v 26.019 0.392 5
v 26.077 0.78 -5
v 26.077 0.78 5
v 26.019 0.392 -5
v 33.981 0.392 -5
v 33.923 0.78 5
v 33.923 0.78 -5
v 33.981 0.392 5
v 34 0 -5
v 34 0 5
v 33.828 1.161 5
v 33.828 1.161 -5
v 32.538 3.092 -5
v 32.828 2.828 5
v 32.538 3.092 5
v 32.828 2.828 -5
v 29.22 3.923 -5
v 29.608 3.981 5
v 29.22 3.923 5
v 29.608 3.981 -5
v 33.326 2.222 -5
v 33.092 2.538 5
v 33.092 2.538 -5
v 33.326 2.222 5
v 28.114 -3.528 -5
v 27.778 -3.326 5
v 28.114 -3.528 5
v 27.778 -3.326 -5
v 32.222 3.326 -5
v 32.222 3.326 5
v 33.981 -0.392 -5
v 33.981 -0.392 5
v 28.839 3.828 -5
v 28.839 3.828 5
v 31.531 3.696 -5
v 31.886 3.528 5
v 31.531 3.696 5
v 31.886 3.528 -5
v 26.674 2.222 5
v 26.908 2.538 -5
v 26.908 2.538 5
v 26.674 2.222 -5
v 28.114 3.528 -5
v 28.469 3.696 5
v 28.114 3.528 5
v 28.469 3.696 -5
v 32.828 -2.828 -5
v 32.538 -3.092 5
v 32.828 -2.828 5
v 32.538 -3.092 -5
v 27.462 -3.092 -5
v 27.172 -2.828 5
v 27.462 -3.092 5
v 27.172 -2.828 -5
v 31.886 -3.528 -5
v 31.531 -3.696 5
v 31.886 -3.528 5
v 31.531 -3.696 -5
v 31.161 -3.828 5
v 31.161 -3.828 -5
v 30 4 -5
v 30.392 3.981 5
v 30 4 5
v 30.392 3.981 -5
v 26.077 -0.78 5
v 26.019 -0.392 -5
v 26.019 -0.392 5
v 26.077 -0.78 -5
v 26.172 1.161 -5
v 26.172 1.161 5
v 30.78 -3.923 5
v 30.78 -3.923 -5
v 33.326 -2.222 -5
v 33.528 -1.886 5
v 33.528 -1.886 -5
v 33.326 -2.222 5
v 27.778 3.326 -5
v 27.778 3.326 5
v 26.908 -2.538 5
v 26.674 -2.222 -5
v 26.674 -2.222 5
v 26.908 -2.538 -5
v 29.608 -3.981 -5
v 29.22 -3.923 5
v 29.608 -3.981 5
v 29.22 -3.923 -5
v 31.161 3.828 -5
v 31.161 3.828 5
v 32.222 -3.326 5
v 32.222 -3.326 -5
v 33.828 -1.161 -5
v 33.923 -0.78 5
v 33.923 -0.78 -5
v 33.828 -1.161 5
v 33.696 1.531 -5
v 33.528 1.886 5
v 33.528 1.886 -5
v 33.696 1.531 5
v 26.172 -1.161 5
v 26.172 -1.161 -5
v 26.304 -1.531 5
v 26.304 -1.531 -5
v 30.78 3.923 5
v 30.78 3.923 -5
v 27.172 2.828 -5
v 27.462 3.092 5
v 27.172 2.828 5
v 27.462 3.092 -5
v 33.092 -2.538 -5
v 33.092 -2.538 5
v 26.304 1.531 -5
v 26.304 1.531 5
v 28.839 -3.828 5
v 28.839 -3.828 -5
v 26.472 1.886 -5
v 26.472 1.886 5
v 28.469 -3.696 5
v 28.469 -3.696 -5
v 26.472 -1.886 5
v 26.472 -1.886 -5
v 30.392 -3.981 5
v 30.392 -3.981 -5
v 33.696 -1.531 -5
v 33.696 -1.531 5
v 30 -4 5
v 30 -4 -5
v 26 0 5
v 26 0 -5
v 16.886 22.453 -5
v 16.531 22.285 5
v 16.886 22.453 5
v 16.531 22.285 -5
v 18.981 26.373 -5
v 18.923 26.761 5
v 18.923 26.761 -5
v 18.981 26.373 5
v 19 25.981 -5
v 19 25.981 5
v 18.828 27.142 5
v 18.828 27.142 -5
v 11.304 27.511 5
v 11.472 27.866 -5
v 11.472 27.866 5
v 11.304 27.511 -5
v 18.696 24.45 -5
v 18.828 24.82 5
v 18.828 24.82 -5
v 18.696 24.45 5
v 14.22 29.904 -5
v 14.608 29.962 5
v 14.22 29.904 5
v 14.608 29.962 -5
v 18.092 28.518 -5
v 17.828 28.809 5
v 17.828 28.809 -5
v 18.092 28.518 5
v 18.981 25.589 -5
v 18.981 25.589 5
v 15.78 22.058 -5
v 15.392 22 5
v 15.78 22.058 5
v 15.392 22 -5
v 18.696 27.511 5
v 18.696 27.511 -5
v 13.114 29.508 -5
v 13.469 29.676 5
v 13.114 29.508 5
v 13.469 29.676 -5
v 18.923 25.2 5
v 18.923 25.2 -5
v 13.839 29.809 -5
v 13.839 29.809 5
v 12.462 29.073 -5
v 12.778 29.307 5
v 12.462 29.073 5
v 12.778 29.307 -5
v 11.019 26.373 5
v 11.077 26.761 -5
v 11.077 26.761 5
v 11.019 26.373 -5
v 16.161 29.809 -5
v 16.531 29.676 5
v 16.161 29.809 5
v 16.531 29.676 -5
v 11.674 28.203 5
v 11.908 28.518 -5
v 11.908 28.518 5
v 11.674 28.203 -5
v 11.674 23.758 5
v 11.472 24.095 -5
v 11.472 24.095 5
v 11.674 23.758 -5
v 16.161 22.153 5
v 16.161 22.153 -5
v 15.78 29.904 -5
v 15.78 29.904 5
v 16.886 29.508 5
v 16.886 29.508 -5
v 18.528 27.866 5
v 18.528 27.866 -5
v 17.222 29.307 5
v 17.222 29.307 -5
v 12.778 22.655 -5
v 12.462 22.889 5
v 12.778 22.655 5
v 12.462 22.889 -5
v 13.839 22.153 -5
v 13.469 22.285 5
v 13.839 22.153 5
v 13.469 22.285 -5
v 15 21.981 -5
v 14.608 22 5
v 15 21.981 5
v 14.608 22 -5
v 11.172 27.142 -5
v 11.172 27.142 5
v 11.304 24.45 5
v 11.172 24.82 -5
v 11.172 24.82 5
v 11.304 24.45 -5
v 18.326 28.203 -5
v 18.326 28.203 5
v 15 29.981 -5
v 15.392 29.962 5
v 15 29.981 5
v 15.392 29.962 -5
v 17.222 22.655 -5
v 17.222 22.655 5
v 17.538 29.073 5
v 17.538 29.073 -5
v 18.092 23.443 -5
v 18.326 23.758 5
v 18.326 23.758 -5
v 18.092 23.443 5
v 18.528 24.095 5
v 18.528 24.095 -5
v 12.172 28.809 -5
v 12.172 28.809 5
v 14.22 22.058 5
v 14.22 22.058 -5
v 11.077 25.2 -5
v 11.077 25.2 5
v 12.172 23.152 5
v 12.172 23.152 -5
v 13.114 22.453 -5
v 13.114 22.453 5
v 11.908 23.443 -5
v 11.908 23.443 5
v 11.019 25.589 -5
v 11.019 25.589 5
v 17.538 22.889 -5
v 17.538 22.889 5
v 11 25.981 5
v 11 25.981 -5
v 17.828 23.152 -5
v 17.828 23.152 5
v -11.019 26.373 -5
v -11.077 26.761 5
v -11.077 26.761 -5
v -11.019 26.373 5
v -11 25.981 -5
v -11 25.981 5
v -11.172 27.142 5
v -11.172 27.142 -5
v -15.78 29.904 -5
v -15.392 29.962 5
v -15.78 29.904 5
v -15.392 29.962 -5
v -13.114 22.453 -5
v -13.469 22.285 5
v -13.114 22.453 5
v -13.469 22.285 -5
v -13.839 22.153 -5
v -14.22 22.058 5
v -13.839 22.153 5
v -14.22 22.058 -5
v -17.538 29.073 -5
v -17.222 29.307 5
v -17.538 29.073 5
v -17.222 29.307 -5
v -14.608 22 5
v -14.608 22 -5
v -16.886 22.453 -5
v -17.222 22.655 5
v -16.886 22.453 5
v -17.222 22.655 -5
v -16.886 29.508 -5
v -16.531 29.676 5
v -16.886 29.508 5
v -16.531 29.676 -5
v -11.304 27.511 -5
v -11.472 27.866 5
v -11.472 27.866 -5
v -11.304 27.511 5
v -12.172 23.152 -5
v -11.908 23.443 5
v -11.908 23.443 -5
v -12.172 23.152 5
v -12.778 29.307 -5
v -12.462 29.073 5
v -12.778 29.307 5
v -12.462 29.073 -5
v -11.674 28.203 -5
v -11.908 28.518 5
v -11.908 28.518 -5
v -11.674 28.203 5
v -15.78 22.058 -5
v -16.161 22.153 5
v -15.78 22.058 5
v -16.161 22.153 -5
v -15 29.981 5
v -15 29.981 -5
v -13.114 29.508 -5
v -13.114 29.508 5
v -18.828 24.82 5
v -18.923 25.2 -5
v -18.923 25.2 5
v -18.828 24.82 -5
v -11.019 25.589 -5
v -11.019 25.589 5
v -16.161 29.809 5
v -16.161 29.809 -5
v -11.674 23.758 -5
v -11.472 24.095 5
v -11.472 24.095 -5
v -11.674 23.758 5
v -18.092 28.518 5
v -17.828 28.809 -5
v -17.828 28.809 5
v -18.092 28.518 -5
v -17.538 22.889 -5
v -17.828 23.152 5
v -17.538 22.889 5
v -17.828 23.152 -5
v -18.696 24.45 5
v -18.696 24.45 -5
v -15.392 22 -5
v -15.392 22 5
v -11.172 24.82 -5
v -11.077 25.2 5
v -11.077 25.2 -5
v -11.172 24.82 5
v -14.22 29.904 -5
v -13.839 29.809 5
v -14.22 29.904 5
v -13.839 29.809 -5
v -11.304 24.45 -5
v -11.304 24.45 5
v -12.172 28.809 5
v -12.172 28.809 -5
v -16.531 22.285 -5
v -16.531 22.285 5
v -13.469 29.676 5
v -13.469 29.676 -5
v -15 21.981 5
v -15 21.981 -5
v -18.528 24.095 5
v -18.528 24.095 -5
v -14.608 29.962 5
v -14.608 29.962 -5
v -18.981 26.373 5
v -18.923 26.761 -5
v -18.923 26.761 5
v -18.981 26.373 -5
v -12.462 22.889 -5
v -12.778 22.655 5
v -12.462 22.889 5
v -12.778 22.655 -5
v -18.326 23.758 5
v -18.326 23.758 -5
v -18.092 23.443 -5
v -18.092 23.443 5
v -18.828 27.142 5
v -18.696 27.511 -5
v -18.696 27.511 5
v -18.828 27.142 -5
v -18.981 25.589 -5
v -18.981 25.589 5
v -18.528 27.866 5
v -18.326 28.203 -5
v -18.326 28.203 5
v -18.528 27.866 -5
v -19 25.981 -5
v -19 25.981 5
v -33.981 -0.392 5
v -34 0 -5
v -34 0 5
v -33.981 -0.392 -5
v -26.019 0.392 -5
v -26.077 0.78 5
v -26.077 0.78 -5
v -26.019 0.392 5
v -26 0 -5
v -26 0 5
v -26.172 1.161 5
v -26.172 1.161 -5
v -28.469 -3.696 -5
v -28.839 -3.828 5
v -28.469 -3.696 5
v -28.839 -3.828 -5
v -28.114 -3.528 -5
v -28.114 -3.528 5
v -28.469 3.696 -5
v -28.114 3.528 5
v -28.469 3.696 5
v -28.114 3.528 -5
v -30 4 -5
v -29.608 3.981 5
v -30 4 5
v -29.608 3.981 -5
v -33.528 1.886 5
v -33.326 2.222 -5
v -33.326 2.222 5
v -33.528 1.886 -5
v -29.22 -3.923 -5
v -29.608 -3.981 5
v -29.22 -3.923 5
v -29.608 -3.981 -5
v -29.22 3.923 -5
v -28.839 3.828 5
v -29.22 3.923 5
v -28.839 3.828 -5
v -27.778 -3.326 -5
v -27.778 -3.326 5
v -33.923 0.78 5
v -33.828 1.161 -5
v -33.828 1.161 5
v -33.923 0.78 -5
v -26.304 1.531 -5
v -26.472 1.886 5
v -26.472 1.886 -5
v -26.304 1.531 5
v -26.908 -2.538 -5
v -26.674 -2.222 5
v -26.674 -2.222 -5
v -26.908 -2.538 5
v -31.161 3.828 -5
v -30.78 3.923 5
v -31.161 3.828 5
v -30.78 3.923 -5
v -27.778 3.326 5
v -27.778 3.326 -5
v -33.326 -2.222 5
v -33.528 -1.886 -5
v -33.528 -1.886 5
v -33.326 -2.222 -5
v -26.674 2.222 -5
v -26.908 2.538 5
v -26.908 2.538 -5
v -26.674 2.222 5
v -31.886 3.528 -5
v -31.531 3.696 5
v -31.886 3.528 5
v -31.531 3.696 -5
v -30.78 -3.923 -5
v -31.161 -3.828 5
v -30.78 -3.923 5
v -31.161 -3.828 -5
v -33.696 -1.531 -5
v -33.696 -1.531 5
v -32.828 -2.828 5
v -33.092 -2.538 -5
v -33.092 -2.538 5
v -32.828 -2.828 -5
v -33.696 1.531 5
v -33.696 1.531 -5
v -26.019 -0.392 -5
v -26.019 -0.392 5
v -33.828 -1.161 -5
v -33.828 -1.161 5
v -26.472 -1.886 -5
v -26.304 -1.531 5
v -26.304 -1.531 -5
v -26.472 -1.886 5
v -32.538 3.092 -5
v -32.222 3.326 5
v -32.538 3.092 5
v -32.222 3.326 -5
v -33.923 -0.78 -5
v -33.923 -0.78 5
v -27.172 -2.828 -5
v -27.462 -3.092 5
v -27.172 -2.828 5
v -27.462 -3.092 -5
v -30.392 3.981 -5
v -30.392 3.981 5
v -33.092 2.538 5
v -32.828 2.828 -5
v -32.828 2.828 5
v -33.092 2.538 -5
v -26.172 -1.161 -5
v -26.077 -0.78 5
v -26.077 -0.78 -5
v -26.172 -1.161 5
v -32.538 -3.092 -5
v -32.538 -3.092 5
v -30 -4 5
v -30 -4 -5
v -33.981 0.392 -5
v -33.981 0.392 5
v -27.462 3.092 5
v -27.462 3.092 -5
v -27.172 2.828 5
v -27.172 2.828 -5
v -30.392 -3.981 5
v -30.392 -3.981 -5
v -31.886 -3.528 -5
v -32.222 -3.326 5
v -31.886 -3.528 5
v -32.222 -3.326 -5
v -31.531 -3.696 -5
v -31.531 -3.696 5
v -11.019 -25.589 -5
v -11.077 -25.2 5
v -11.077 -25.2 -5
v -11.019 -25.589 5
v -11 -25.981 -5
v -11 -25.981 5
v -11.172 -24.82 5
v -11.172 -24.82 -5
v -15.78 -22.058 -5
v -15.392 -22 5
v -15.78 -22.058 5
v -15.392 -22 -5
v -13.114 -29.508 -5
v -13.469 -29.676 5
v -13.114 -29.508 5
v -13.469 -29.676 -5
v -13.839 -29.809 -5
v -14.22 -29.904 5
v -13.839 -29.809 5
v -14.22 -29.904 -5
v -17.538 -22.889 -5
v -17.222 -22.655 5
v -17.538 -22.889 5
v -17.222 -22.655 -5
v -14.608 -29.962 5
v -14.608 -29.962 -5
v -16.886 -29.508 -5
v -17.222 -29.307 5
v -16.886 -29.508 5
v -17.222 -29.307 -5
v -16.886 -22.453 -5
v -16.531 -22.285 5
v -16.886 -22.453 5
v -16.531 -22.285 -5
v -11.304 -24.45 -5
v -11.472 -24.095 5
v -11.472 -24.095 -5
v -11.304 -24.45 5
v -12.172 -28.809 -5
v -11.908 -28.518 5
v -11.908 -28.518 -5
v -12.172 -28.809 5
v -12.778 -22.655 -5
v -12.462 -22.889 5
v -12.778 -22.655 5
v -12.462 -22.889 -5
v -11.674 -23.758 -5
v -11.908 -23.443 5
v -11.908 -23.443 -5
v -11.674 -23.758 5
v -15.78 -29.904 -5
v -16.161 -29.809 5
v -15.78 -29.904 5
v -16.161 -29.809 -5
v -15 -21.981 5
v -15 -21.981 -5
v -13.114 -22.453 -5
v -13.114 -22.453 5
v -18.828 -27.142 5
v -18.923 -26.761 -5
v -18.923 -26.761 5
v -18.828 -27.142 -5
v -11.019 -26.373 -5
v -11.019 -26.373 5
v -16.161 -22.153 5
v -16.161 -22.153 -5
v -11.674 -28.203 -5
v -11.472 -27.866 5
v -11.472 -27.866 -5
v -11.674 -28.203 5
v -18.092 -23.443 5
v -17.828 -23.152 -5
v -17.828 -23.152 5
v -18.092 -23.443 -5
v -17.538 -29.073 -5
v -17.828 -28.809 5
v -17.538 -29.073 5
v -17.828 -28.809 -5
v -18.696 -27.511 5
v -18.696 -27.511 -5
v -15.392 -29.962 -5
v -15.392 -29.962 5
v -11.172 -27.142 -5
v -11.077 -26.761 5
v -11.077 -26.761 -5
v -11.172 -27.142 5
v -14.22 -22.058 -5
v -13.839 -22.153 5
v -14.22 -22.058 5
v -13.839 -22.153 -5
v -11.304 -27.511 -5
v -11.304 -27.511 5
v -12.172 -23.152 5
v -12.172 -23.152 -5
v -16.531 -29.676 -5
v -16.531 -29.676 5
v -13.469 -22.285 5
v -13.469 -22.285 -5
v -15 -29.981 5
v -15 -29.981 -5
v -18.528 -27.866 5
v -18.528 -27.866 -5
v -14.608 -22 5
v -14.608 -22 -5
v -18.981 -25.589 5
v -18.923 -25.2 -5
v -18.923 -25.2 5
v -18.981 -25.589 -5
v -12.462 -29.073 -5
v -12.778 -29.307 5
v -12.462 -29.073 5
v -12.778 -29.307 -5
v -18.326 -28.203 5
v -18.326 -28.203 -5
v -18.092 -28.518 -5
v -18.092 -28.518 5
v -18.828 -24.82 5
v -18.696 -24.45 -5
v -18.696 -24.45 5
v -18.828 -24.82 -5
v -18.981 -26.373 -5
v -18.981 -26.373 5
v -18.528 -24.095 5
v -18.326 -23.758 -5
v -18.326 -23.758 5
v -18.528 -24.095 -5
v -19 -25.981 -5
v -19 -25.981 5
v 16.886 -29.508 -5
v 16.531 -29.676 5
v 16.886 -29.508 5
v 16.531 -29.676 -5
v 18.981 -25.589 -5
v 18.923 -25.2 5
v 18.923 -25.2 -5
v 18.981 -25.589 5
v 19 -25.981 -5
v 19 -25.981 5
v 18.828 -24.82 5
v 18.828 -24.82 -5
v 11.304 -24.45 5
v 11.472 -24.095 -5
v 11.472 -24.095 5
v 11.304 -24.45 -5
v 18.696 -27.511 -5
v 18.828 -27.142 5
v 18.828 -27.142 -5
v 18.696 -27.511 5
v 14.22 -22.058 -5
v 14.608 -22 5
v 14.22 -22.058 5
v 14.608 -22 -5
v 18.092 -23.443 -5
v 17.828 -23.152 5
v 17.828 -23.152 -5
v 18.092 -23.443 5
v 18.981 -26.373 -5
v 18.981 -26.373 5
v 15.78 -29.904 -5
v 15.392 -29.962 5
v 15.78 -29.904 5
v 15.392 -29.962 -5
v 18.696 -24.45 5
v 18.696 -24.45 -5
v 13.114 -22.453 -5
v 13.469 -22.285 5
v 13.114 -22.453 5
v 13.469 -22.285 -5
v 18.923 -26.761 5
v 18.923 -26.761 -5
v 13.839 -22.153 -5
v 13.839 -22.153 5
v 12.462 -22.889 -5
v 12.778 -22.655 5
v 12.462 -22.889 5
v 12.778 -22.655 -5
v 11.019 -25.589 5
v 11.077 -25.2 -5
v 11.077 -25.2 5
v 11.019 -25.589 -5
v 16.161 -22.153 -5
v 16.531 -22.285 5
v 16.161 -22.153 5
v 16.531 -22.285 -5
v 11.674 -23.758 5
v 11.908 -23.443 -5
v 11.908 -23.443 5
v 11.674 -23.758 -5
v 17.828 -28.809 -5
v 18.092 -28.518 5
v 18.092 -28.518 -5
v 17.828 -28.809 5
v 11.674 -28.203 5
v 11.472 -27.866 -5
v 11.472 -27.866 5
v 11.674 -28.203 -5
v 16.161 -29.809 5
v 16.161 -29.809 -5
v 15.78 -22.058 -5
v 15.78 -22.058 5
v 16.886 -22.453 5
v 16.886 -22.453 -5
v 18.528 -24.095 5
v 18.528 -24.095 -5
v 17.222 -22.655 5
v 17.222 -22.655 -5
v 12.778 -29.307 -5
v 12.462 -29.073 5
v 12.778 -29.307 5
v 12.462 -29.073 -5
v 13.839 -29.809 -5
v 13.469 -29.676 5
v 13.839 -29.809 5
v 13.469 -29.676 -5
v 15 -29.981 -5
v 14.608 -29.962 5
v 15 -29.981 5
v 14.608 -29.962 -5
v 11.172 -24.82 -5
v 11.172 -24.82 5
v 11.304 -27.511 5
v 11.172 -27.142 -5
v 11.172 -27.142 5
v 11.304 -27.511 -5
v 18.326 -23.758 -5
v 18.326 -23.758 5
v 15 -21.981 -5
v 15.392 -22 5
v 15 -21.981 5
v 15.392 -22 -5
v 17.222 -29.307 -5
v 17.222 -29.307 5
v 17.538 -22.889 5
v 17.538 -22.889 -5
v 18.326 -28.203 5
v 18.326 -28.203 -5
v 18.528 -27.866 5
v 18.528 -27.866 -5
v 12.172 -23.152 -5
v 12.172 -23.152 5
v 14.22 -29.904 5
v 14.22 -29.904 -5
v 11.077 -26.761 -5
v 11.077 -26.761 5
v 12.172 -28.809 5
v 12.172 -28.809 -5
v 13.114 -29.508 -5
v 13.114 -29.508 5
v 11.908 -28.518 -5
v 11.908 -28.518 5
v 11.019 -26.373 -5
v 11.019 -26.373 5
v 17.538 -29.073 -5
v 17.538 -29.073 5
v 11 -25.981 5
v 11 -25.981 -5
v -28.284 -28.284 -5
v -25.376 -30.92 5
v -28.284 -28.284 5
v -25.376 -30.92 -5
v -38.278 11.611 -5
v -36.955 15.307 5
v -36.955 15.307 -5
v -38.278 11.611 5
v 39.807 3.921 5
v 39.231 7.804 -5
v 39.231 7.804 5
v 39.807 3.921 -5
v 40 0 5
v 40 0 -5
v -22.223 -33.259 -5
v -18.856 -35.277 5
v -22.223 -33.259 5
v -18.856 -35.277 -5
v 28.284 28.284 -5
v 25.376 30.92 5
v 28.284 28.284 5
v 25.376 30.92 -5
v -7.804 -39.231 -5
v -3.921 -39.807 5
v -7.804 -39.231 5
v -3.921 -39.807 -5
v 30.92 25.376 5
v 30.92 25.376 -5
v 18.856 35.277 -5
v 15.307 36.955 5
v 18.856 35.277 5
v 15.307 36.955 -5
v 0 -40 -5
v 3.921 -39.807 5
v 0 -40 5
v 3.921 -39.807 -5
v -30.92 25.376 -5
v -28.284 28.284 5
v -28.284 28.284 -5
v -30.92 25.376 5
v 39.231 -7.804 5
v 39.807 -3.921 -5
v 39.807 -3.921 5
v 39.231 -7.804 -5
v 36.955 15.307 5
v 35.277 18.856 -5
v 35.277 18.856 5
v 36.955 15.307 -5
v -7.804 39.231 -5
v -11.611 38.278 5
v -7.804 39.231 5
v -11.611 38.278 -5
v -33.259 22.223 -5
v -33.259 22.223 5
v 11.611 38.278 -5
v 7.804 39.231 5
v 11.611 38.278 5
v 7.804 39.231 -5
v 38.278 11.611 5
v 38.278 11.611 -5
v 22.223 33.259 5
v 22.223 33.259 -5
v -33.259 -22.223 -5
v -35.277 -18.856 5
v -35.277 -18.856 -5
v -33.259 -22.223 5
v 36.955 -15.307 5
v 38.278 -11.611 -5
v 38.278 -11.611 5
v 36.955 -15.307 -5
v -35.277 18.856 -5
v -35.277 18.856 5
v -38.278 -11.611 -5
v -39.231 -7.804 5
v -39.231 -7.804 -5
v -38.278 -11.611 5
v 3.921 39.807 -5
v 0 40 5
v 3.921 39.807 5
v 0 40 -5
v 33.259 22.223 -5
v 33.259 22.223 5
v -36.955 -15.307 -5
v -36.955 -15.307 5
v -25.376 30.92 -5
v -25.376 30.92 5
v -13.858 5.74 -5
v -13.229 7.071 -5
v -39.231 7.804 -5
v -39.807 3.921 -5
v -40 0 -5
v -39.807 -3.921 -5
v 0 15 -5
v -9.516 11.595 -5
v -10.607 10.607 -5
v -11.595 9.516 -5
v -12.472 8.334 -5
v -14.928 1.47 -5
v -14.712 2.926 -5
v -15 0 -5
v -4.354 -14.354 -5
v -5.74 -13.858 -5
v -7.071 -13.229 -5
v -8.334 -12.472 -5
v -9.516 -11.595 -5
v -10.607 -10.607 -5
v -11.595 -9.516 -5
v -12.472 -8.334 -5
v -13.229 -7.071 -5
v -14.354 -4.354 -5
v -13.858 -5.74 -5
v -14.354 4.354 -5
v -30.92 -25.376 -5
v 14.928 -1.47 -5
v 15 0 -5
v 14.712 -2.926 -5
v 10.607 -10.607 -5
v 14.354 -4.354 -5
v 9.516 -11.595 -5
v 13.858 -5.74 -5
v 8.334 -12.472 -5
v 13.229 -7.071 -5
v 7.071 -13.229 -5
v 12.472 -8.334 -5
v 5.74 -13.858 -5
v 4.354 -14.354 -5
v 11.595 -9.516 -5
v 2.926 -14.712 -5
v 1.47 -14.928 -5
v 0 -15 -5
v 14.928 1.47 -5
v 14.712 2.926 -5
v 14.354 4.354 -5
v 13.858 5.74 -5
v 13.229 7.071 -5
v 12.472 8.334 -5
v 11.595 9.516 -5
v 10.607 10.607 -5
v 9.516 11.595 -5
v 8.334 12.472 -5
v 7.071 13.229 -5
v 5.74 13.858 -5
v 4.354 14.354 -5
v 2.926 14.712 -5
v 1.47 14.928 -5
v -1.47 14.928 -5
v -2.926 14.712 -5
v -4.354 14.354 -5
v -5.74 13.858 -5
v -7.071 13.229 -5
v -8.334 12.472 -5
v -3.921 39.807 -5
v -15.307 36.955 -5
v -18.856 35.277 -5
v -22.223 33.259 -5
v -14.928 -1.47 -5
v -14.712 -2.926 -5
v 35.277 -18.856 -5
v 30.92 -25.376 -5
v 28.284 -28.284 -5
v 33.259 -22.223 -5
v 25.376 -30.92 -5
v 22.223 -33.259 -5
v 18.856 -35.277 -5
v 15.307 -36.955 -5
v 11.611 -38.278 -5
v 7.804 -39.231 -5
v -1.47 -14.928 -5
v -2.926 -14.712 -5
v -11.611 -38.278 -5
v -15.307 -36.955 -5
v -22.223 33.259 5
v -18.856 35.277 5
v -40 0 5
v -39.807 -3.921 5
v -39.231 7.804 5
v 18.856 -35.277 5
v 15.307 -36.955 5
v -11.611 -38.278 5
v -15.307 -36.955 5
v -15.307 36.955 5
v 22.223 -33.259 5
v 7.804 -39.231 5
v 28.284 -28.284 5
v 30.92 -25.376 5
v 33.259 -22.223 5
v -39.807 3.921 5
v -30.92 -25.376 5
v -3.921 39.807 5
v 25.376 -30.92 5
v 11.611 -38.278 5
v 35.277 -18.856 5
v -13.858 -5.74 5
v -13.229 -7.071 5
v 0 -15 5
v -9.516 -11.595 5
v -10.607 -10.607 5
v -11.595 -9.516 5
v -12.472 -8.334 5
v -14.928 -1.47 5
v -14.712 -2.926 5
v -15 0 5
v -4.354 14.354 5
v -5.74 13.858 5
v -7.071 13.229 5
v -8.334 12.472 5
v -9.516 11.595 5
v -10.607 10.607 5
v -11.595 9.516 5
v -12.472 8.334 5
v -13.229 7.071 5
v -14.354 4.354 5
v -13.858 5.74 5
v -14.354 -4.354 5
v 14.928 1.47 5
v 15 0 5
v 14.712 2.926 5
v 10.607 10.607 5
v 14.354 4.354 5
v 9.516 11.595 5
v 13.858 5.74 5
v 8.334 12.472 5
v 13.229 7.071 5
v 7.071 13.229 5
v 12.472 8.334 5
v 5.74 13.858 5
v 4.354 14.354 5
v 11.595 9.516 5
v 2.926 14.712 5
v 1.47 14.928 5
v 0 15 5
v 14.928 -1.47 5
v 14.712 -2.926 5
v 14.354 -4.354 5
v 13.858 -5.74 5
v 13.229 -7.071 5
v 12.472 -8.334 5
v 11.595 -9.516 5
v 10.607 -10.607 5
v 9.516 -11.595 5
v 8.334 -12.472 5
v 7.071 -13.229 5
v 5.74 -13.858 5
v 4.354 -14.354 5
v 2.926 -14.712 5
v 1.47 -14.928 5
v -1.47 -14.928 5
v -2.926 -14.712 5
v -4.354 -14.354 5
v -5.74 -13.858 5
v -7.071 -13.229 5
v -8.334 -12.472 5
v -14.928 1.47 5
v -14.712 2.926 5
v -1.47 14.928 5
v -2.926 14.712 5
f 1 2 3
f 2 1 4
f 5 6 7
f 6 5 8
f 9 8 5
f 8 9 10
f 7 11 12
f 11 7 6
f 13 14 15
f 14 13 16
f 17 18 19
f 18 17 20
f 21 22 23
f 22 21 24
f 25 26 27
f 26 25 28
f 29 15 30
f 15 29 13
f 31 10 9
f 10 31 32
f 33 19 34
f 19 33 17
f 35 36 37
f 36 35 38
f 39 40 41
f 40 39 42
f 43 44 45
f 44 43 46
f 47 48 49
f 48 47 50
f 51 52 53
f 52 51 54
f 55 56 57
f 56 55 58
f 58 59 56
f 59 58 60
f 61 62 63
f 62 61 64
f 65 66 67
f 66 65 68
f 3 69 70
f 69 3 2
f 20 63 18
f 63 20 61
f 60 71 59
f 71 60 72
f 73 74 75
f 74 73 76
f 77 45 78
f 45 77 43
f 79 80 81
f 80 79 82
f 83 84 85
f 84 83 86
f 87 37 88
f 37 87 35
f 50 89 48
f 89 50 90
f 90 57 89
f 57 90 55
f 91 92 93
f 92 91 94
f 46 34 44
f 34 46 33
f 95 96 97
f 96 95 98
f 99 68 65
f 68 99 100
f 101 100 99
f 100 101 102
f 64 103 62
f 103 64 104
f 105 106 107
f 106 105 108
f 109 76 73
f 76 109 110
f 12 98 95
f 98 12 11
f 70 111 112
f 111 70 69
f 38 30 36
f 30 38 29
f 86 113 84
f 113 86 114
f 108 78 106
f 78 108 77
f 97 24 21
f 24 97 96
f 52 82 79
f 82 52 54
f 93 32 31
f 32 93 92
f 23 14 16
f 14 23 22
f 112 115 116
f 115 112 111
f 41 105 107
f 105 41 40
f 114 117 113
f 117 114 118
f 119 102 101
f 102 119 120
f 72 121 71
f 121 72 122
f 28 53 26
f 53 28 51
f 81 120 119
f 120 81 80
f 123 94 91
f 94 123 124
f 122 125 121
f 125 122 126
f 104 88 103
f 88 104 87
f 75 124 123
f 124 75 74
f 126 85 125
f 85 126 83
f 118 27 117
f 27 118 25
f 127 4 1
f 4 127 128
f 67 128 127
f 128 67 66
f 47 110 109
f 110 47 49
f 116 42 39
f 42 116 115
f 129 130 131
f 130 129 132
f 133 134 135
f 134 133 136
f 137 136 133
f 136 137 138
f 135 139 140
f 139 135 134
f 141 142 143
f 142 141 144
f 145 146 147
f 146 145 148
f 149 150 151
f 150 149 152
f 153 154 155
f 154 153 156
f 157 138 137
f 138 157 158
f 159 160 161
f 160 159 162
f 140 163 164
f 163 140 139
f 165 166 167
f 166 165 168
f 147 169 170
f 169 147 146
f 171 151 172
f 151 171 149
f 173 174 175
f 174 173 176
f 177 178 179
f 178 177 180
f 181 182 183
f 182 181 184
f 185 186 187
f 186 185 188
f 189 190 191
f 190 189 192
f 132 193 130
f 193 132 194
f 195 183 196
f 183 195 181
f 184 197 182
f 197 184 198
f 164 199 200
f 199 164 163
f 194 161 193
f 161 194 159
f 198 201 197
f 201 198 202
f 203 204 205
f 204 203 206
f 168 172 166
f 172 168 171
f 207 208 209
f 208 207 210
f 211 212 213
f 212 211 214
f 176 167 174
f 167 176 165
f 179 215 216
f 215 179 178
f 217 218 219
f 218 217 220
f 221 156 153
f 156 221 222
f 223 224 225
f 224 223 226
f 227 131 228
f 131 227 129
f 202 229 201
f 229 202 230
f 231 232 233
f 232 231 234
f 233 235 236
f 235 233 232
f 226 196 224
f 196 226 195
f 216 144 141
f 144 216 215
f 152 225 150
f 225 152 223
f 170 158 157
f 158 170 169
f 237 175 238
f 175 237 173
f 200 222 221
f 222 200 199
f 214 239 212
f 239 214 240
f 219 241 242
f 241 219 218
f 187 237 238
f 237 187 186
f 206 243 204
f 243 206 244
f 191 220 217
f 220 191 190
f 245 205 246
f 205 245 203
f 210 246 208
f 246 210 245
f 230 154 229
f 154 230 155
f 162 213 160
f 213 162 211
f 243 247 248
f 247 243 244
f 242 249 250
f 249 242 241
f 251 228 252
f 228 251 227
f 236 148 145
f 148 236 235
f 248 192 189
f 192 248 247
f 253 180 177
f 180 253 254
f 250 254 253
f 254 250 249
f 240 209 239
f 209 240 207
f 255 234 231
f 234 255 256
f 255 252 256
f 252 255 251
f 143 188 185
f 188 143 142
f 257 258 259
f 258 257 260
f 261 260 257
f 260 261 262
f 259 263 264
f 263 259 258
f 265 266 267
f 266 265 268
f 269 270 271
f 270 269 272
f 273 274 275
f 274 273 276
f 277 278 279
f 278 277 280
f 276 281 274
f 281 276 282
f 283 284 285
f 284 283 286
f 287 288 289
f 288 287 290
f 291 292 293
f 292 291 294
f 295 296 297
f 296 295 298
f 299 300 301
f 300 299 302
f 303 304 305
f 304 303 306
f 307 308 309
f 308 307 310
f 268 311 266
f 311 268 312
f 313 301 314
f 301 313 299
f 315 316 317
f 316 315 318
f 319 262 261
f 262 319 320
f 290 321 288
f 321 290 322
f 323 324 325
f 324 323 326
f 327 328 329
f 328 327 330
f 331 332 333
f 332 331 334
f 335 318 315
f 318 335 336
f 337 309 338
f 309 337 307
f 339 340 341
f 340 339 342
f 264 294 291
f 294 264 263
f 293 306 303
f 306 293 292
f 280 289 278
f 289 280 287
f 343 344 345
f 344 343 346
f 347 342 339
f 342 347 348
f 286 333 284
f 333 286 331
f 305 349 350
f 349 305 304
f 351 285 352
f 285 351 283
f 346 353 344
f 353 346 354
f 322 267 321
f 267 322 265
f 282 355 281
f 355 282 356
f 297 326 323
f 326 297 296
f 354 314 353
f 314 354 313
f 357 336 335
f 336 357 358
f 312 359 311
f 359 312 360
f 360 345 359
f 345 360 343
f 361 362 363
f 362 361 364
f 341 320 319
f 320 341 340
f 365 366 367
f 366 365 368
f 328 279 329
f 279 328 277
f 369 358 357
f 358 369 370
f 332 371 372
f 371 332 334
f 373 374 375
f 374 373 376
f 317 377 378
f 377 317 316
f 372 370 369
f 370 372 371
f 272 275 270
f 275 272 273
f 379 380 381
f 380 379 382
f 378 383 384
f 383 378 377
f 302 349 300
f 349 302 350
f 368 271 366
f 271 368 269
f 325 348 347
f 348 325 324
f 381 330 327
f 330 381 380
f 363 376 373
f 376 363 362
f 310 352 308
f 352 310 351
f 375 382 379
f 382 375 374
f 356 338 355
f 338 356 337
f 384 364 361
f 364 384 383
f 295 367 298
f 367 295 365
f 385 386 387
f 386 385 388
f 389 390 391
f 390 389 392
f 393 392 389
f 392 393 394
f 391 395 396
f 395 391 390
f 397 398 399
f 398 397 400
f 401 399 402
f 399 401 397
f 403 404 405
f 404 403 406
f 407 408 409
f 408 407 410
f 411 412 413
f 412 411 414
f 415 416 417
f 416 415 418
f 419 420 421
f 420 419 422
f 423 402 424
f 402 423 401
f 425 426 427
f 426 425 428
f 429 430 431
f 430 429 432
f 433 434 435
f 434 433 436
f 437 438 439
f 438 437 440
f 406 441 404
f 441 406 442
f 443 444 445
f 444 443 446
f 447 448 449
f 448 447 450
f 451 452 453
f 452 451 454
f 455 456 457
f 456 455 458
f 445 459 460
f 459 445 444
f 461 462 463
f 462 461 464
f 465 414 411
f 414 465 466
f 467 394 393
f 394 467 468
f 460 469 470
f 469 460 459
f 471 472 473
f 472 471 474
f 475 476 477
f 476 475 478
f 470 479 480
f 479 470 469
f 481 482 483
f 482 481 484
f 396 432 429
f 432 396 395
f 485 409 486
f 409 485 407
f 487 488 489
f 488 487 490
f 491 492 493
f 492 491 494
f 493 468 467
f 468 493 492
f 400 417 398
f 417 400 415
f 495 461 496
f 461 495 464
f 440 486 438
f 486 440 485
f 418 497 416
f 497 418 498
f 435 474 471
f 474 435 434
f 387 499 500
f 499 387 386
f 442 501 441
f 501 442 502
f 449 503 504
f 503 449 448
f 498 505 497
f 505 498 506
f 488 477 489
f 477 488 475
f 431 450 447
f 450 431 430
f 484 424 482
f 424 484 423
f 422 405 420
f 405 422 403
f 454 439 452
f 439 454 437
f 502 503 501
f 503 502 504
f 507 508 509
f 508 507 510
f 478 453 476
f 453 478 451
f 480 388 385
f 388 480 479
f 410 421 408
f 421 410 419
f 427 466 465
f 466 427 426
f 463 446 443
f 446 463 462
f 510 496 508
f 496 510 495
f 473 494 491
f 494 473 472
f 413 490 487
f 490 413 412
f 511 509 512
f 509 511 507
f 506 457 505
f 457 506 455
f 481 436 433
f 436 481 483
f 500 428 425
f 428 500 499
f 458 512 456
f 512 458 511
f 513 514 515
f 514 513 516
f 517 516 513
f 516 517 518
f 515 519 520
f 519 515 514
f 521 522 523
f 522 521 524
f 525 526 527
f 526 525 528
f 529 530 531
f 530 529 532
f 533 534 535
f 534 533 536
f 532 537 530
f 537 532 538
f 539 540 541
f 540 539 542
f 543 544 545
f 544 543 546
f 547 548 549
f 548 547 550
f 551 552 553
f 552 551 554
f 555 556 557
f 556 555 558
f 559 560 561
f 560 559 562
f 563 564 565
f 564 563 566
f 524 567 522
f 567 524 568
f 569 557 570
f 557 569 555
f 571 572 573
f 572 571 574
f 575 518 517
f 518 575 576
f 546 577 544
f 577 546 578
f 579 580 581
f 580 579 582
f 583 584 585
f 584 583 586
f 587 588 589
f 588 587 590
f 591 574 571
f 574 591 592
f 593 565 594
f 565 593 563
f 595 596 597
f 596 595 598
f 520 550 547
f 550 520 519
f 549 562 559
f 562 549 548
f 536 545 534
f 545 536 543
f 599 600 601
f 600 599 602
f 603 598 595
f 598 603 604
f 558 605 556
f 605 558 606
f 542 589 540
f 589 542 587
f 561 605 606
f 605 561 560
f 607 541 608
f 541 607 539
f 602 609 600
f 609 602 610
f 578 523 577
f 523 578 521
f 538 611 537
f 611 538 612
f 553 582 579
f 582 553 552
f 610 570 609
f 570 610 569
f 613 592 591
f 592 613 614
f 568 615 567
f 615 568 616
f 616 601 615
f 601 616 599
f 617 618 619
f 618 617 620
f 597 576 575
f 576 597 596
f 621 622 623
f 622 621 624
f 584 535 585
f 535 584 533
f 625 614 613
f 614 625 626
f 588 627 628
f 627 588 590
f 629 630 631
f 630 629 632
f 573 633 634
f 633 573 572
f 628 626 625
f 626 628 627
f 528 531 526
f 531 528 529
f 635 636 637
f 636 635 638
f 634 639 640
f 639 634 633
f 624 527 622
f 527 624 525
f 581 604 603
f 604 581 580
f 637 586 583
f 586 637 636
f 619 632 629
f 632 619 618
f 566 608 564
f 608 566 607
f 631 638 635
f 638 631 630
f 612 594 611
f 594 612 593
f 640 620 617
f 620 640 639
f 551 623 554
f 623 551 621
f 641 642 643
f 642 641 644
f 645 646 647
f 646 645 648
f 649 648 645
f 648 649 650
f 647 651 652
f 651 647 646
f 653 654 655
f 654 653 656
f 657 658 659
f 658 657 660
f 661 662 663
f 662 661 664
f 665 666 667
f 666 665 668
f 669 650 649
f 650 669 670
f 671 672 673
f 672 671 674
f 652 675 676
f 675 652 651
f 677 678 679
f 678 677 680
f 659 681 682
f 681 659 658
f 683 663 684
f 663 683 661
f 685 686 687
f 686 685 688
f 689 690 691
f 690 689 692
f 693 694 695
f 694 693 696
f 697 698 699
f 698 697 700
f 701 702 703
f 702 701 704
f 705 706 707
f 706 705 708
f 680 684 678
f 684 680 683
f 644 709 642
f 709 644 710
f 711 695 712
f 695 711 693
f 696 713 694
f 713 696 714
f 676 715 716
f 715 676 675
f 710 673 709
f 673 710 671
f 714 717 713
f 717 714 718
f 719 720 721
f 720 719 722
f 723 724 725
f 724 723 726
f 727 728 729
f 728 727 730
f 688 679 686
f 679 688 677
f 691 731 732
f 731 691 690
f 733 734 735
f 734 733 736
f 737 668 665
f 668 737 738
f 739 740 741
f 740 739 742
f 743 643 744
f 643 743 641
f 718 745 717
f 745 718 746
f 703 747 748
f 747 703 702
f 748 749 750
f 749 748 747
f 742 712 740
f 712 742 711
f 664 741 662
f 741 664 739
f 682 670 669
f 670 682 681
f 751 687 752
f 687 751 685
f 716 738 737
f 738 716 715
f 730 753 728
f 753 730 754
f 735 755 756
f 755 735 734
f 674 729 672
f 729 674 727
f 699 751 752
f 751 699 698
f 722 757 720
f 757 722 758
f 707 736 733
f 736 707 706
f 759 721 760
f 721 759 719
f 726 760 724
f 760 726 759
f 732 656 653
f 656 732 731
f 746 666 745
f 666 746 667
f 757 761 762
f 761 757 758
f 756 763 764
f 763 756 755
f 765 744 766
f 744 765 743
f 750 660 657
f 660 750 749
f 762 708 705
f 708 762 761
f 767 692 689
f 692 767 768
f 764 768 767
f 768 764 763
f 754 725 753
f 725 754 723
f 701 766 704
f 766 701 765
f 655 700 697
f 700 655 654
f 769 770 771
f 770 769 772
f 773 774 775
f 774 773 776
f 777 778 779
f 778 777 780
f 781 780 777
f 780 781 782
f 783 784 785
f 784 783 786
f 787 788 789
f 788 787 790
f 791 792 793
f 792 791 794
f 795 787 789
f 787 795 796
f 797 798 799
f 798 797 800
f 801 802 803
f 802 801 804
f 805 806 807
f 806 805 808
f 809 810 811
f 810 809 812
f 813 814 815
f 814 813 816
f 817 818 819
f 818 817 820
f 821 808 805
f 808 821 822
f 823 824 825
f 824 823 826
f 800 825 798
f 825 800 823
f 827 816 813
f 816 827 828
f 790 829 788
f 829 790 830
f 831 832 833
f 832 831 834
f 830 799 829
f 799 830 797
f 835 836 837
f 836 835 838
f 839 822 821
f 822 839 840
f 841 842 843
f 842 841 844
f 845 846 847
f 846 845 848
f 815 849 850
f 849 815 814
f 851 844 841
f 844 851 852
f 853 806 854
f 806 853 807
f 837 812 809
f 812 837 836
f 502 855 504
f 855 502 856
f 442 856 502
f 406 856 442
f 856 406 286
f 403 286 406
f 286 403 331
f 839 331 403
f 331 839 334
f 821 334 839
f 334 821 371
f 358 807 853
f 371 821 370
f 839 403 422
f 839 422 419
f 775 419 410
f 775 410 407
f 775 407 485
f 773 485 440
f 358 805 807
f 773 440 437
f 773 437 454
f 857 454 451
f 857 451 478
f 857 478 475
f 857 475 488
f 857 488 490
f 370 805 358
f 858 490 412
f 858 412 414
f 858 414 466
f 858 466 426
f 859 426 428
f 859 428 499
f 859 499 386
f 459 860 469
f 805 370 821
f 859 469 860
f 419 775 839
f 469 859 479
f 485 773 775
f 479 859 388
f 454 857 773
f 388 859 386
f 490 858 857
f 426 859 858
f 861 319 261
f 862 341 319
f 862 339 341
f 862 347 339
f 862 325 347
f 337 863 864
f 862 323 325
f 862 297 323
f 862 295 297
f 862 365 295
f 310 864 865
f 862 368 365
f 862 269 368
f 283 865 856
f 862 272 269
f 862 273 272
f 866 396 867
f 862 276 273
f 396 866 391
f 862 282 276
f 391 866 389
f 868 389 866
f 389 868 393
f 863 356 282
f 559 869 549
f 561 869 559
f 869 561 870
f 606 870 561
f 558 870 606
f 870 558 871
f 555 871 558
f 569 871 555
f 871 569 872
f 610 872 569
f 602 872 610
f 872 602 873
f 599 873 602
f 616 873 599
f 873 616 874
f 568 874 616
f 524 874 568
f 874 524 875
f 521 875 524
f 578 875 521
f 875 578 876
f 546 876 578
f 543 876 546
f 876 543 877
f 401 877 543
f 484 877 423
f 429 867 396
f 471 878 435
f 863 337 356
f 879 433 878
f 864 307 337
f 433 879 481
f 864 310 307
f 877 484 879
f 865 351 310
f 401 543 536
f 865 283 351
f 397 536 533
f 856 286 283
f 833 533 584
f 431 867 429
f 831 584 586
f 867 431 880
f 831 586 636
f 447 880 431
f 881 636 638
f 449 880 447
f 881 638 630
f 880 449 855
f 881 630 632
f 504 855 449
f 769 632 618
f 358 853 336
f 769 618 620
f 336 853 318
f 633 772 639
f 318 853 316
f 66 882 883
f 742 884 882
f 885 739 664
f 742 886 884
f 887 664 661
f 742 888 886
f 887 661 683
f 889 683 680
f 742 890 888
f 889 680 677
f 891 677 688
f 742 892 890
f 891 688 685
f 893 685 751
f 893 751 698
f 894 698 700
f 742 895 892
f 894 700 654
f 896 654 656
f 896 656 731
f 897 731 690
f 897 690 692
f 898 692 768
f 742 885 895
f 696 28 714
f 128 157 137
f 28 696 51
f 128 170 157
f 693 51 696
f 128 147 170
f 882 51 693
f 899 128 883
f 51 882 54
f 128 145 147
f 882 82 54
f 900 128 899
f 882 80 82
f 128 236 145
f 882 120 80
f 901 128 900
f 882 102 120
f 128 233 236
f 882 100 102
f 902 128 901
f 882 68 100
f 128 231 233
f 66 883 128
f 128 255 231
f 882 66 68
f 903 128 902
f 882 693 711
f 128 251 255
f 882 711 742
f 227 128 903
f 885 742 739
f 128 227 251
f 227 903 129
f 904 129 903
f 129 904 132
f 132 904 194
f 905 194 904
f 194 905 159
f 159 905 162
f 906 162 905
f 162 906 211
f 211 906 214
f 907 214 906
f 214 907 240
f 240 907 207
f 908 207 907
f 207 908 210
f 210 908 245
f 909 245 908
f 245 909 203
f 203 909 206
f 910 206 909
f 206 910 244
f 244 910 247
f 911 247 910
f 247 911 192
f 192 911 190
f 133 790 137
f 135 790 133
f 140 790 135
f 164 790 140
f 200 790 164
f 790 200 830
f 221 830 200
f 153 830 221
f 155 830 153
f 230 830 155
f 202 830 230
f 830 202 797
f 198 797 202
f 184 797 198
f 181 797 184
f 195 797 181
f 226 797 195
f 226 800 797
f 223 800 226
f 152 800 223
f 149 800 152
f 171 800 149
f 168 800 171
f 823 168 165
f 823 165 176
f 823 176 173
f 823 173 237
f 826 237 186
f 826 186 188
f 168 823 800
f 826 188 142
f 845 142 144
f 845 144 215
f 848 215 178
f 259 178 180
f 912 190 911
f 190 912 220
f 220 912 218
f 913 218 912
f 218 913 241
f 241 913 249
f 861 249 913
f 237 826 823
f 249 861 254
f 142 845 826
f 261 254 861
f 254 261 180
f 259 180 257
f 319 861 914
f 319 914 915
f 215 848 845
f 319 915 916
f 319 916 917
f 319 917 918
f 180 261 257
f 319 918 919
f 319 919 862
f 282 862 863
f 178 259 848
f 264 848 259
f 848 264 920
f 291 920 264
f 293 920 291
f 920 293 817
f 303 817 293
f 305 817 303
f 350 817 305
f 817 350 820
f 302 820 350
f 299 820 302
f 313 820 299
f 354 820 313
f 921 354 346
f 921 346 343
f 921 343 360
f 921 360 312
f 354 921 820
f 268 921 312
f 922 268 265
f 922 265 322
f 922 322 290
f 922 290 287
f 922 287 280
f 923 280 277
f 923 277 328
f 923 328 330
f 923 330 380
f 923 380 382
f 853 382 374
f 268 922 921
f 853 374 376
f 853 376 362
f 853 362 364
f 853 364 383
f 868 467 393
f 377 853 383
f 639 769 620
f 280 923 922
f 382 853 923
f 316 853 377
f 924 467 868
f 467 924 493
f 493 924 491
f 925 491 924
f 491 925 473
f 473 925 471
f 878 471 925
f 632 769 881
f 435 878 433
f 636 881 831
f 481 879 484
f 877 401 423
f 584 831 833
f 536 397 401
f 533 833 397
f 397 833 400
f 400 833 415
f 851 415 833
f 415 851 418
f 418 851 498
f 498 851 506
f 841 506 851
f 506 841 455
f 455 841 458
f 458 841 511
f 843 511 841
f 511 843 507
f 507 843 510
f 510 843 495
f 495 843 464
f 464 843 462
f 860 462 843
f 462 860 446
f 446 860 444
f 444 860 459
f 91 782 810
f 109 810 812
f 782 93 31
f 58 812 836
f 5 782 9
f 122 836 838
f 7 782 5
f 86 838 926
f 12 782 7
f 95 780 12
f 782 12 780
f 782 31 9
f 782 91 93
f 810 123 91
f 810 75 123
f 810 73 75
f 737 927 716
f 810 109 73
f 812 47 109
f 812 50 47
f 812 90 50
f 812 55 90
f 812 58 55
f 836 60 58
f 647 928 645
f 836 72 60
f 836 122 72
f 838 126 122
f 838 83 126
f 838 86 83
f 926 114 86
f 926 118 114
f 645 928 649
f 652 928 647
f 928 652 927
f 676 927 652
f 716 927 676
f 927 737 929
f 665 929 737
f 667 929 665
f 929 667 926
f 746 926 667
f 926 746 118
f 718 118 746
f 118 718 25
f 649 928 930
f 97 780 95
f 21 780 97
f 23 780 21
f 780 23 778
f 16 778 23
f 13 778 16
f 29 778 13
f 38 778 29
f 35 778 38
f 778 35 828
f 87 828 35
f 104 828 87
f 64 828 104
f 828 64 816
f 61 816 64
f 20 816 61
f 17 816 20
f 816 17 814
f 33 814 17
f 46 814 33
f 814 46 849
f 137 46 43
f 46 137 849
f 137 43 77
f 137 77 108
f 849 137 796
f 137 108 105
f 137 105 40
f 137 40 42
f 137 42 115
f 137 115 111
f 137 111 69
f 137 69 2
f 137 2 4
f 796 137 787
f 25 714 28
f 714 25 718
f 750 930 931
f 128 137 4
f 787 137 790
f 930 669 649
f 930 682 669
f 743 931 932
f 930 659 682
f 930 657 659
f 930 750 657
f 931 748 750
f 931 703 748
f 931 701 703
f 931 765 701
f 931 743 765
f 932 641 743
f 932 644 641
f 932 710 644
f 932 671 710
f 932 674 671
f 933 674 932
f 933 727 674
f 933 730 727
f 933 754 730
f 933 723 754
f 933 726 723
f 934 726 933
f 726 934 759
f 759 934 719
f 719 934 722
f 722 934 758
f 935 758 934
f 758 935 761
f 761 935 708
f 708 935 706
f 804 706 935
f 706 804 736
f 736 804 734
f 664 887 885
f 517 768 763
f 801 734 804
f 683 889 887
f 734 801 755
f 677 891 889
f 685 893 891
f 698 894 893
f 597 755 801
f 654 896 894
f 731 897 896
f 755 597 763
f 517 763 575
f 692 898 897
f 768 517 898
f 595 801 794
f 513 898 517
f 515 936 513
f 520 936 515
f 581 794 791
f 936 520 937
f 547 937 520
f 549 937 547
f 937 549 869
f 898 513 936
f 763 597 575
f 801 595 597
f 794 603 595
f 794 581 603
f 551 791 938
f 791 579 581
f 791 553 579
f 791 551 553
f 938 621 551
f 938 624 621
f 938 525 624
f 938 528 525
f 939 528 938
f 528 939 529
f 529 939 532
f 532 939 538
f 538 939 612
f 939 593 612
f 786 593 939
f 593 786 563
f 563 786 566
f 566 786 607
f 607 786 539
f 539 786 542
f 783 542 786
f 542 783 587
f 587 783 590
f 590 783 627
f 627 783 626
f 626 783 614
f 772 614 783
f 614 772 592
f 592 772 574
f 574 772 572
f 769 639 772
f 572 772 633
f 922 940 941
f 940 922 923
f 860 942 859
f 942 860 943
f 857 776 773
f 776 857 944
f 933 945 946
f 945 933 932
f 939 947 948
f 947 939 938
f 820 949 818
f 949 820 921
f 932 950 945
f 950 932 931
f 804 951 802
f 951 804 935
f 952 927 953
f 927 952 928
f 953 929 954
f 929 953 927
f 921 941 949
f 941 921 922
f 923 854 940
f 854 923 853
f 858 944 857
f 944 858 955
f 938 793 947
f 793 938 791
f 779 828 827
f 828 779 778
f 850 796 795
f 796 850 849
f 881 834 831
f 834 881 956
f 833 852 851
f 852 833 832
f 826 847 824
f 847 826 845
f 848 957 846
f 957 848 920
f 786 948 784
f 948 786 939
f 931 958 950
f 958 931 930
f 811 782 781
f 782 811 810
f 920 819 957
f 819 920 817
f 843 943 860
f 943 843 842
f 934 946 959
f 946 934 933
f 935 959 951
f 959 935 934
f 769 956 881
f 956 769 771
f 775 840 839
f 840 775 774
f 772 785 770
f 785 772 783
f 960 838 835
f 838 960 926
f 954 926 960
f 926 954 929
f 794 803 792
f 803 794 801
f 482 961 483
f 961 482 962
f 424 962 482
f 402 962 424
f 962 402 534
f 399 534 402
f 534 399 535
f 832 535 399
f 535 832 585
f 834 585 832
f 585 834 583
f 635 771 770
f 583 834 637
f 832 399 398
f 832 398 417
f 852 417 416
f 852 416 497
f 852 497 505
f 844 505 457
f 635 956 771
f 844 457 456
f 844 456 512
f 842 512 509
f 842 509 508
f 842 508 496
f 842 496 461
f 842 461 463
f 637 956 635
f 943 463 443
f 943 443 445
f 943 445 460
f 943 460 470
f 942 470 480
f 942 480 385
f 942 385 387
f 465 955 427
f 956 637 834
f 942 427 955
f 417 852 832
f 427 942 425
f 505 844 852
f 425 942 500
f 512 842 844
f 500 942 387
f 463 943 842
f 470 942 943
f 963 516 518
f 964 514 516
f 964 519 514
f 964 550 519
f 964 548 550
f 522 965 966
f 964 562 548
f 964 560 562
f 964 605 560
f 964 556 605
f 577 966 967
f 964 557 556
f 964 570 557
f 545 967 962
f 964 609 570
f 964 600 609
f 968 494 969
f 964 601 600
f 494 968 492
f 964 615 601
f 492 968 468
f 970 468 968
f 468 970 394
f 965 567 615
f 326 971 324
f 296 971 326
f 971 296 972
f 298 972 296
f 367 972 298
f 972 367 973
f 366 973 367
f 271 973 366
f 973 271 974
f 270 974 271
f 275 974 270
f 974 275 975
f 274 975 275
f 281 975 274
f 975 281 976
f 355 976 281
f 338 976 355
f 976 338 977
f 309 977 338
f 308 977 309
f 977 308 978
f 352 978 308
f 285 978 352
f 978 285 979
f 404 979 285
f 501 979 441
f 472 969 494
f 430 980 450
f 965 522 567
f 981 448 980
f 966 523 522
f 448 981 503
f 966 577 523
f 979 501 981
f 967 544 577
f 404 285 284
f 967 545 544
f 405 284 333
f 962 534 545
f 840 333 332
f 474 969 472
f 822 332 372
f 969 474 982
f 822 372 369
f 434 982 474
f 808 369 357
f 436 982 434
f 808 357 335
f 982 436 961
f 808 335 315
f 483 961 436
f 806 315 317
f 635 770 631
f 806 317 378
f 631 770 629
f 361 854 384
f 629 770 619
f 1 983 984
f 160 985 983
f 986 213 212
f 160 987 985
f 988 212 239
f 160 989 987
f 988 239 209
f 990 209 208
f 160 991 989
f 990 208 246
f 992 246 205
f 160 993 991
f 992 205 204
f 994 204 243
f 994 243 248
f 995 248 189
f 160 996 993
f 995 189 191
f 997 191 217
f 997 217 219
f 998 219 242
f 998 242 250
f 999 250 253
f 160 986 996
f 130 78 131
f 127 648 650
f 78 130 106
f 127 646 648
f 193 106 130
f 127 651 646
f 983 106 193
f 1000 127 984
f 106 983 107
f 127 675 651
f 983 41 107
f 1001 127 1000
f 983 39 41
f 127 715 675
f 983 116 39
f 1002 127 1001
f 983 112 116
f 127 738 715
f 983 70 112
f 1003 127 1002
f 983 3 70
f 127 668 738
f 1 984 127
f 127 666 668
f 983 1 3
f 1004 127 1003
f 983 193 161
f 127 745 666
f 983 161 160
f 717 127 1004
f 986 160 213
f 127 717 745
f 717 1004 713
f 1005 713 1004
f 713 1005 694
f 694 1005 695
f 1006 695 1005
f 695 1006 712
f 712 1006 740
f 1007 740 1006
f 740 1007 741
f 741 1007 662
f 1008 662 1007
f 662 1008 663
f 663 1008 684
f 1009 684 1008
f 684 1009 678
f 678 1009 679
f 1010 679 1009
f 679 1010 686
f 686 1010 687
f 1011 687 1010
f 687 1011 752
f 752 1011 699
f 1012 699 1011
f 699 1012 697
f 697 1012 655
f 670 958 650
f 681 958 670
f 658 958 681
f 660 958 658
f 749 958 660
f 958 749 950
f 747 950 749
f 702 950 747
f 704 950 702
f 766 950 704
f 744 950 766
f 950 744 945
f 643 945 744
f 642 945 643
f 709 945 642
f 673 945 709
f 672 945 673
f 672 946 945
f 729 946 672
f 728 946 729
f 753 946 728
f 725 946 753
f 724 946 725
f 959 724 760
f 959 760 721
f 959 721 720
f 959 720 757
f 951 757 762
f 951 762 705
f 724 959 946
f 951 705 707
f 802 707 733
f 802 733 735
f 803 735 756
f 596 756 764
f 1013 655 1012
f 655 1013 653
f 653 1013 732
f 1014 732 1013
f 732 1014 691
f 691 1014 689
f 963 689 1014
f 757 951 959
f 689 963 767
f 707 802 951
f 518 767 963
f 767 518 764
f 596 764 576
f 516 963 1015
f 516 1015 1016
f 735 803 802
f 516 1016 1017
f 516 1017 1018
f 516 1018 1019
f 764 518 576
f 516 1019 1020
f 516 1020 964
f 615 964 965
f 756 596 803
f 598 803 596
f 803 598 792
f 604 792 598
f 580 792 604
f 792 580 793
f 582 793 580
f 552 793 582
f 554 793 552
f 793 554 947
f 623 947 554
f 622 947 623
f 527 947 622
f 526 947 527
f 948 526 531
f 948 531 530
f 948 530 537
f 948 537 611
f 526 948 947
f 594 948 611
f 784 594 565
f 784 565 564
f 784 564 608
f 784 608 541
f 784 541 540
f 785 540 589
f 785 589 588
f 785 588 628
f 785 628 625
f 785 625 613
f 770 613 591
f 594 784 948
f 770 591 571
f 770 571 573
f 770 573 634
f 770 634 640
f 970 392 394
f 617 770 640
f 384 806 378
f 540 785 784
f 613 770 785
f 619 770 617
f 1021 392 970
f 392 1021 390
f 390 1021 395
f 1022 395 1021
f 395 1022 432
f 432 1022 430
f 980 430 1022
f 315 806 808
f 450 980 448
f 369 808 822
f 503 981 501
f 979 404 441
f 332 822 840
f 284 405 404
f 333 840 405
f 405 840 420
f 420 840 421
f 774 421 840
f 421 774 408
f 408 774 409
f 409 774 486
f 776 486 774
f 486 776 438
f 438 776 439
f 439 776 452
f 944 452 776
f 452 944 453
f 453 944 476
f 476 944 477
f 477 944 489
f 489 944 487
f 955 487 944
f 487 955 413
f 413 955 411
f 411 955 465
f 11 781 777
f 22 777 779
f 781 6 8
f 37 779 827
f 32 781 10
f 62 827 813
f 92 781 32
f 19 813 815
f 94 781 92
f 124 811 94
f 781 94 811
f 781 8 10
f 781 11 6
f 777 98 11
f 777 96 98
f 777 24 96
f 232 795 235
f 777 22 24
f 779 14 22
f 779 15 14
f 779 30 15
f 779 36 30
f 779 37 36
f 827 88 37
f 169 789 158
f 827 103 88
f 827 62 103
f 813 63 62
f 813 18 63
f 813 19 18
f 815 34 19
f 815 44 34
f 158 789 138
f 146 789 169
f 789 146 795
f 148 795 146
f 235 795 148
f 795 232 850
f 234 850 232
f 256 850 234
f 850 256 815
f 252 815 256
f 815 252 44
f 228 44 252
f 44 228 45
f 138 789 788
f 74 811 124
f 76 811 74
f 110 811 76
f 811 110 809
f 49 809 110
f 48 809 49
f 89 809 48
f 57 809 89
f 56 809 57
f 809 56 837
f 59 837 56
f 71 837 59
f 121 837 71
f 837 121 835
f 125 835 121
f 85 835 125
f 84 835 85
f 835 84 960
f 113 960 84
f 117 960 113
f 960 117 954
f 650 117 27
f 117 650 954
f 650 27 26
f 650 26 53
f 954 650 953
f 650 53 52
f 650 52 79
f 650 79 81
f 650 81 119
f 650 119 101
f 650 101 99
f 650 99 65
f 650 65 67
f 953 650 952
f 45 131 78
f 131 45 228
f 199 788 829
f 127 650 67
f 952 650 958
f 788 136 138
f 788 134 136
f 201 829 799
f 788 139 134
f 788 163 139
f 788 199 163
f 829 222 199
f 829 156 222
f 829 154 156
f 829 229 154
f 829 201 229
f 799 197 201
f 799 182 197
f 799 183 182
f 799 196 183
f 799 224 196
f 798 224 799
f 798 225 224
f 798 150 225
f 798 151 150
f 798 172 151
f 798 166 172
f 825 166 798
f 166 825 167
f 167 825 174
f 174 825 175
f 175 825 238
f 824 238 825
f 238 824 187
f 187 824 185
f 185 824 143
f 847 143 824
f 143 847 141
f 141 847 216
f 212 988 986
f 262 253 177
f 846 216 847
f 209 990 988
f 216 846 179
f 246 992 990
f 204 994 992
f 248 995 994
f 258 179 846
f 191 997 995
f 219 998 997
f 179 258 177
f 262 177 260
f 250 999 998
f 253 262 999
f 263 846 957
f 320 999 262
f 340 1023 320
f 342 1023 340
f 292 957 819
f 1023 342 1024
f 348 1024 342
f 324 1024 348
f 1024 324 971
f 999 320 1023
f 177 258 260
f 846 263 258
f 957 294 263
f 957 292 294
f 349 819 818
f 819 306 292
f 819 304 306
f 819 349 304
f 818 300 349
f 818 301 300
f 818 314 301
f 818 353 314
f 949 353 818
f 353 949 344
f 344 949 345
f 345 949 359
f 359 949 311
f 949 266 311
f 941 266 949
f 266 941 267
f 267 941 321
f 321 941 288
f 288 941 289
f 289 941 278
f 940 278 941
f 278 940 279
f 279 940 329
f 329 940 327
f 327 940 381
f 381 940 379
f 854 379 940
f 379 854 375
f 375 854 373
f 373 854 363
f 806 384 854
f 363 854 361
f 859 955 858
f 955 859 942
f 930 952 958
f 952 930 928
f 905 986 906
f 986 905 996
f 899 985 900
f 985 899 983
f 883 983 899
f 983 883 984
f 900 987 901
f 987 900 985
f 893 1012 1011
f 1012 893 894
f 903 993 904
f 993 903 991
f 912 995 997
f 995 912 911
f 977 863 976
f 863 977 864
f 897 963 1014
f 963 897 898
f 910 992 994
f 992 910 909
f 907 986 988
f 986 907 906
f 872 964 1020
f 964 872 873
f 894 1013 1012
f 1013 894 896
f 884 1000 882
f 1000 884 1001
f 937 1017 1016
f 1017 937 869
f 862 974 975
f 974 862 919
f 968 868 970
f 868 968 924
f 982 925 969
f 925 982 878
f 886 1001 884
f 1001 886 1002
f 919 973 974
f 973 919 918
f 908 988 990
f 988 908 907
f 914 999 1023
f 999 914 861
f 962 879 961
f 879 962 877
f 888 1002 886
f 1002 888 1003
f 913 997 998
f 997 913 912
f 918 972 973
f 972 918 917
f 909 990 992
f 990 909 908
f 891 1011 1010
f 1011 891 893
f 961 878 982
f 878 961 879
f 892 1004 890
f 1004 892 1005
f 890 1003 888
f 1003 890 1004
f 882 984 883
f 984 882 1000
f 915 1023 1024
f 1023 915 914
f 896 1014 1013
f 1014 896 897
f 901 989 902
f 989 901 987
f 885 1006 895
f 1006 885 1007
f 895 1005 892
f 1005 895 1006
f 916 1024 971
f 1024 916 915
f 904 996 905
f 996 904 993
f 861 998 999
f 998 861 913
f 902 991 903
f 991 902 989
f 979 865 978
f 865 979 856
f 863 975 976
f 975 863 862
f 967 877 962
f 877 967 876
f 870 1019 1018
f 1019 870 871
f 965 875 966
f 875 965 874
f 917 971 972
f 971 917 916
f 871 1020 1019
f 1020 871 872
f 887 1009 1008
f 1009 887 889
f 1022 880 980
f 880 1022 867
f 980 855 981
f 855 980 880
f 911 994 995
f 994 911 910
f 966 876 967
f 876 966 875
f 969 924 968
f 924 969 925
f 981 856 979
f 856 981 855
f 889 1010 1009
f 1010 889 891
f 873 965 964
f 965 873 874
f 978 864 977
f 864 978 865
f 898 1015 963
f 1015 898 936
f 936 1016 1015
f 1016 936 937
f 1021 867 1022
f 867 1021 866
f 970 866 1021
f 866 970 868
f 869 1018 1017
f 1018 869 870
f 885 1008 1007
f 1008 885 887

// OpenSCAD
// Golden (c) — Ø80x10mm flange, Ø30 centre bore, 6x Ø8 bolt-circle holes at r=30mm.
// Every cutter overshoots both faces (height = thickness + 2*overshoot, centred on
// z=0) so all 7 holes are genuine through-holes, never blind no-ops.
//
// Genus, worked out (not assumed) in tests/test_scad_spike.py: a solid disc is
// genus 0 (simply connected, like a ball); the centre bore alone makes it an
// annulus/torus topology (genus 1); each of the 6 additional through-holes on the
// bolt circle adds one more independent handle (genus += 1 per hole, regardless
// of the base surface's existing genus, as long as the holes stay disjoint) ->
// genus 1 + 6 = 7 predicted. The test measures scad_mesh_gate's actual genus_sum
// and asserts whatever trimesh reports, commenting on any mismatch.
$fn = 64;

od          = 80;
thickness   = 10;
bore_d      = 30;
bolt_circle_r = 30;
bolt_hole_d = 8;
bolt_count  = 6;

module bolt_holes() {
    for (i = [0 : bolt_count - 1]) {
        a = i * 360 / bolt_count;
        translate([bolt_circle_r * cos(a), bolt_circle_r * sin(a), 0])
            cylinder(h = thickness + 4, r = bolt_hole_d / 2, center = true);
    }
}

difference() {
    cylinder(h = thickness, r = od / 2, center = true);
    cylinder(h = thickness + 4, r = bore_d / 2, center = true);
    bolt_holes();
}
